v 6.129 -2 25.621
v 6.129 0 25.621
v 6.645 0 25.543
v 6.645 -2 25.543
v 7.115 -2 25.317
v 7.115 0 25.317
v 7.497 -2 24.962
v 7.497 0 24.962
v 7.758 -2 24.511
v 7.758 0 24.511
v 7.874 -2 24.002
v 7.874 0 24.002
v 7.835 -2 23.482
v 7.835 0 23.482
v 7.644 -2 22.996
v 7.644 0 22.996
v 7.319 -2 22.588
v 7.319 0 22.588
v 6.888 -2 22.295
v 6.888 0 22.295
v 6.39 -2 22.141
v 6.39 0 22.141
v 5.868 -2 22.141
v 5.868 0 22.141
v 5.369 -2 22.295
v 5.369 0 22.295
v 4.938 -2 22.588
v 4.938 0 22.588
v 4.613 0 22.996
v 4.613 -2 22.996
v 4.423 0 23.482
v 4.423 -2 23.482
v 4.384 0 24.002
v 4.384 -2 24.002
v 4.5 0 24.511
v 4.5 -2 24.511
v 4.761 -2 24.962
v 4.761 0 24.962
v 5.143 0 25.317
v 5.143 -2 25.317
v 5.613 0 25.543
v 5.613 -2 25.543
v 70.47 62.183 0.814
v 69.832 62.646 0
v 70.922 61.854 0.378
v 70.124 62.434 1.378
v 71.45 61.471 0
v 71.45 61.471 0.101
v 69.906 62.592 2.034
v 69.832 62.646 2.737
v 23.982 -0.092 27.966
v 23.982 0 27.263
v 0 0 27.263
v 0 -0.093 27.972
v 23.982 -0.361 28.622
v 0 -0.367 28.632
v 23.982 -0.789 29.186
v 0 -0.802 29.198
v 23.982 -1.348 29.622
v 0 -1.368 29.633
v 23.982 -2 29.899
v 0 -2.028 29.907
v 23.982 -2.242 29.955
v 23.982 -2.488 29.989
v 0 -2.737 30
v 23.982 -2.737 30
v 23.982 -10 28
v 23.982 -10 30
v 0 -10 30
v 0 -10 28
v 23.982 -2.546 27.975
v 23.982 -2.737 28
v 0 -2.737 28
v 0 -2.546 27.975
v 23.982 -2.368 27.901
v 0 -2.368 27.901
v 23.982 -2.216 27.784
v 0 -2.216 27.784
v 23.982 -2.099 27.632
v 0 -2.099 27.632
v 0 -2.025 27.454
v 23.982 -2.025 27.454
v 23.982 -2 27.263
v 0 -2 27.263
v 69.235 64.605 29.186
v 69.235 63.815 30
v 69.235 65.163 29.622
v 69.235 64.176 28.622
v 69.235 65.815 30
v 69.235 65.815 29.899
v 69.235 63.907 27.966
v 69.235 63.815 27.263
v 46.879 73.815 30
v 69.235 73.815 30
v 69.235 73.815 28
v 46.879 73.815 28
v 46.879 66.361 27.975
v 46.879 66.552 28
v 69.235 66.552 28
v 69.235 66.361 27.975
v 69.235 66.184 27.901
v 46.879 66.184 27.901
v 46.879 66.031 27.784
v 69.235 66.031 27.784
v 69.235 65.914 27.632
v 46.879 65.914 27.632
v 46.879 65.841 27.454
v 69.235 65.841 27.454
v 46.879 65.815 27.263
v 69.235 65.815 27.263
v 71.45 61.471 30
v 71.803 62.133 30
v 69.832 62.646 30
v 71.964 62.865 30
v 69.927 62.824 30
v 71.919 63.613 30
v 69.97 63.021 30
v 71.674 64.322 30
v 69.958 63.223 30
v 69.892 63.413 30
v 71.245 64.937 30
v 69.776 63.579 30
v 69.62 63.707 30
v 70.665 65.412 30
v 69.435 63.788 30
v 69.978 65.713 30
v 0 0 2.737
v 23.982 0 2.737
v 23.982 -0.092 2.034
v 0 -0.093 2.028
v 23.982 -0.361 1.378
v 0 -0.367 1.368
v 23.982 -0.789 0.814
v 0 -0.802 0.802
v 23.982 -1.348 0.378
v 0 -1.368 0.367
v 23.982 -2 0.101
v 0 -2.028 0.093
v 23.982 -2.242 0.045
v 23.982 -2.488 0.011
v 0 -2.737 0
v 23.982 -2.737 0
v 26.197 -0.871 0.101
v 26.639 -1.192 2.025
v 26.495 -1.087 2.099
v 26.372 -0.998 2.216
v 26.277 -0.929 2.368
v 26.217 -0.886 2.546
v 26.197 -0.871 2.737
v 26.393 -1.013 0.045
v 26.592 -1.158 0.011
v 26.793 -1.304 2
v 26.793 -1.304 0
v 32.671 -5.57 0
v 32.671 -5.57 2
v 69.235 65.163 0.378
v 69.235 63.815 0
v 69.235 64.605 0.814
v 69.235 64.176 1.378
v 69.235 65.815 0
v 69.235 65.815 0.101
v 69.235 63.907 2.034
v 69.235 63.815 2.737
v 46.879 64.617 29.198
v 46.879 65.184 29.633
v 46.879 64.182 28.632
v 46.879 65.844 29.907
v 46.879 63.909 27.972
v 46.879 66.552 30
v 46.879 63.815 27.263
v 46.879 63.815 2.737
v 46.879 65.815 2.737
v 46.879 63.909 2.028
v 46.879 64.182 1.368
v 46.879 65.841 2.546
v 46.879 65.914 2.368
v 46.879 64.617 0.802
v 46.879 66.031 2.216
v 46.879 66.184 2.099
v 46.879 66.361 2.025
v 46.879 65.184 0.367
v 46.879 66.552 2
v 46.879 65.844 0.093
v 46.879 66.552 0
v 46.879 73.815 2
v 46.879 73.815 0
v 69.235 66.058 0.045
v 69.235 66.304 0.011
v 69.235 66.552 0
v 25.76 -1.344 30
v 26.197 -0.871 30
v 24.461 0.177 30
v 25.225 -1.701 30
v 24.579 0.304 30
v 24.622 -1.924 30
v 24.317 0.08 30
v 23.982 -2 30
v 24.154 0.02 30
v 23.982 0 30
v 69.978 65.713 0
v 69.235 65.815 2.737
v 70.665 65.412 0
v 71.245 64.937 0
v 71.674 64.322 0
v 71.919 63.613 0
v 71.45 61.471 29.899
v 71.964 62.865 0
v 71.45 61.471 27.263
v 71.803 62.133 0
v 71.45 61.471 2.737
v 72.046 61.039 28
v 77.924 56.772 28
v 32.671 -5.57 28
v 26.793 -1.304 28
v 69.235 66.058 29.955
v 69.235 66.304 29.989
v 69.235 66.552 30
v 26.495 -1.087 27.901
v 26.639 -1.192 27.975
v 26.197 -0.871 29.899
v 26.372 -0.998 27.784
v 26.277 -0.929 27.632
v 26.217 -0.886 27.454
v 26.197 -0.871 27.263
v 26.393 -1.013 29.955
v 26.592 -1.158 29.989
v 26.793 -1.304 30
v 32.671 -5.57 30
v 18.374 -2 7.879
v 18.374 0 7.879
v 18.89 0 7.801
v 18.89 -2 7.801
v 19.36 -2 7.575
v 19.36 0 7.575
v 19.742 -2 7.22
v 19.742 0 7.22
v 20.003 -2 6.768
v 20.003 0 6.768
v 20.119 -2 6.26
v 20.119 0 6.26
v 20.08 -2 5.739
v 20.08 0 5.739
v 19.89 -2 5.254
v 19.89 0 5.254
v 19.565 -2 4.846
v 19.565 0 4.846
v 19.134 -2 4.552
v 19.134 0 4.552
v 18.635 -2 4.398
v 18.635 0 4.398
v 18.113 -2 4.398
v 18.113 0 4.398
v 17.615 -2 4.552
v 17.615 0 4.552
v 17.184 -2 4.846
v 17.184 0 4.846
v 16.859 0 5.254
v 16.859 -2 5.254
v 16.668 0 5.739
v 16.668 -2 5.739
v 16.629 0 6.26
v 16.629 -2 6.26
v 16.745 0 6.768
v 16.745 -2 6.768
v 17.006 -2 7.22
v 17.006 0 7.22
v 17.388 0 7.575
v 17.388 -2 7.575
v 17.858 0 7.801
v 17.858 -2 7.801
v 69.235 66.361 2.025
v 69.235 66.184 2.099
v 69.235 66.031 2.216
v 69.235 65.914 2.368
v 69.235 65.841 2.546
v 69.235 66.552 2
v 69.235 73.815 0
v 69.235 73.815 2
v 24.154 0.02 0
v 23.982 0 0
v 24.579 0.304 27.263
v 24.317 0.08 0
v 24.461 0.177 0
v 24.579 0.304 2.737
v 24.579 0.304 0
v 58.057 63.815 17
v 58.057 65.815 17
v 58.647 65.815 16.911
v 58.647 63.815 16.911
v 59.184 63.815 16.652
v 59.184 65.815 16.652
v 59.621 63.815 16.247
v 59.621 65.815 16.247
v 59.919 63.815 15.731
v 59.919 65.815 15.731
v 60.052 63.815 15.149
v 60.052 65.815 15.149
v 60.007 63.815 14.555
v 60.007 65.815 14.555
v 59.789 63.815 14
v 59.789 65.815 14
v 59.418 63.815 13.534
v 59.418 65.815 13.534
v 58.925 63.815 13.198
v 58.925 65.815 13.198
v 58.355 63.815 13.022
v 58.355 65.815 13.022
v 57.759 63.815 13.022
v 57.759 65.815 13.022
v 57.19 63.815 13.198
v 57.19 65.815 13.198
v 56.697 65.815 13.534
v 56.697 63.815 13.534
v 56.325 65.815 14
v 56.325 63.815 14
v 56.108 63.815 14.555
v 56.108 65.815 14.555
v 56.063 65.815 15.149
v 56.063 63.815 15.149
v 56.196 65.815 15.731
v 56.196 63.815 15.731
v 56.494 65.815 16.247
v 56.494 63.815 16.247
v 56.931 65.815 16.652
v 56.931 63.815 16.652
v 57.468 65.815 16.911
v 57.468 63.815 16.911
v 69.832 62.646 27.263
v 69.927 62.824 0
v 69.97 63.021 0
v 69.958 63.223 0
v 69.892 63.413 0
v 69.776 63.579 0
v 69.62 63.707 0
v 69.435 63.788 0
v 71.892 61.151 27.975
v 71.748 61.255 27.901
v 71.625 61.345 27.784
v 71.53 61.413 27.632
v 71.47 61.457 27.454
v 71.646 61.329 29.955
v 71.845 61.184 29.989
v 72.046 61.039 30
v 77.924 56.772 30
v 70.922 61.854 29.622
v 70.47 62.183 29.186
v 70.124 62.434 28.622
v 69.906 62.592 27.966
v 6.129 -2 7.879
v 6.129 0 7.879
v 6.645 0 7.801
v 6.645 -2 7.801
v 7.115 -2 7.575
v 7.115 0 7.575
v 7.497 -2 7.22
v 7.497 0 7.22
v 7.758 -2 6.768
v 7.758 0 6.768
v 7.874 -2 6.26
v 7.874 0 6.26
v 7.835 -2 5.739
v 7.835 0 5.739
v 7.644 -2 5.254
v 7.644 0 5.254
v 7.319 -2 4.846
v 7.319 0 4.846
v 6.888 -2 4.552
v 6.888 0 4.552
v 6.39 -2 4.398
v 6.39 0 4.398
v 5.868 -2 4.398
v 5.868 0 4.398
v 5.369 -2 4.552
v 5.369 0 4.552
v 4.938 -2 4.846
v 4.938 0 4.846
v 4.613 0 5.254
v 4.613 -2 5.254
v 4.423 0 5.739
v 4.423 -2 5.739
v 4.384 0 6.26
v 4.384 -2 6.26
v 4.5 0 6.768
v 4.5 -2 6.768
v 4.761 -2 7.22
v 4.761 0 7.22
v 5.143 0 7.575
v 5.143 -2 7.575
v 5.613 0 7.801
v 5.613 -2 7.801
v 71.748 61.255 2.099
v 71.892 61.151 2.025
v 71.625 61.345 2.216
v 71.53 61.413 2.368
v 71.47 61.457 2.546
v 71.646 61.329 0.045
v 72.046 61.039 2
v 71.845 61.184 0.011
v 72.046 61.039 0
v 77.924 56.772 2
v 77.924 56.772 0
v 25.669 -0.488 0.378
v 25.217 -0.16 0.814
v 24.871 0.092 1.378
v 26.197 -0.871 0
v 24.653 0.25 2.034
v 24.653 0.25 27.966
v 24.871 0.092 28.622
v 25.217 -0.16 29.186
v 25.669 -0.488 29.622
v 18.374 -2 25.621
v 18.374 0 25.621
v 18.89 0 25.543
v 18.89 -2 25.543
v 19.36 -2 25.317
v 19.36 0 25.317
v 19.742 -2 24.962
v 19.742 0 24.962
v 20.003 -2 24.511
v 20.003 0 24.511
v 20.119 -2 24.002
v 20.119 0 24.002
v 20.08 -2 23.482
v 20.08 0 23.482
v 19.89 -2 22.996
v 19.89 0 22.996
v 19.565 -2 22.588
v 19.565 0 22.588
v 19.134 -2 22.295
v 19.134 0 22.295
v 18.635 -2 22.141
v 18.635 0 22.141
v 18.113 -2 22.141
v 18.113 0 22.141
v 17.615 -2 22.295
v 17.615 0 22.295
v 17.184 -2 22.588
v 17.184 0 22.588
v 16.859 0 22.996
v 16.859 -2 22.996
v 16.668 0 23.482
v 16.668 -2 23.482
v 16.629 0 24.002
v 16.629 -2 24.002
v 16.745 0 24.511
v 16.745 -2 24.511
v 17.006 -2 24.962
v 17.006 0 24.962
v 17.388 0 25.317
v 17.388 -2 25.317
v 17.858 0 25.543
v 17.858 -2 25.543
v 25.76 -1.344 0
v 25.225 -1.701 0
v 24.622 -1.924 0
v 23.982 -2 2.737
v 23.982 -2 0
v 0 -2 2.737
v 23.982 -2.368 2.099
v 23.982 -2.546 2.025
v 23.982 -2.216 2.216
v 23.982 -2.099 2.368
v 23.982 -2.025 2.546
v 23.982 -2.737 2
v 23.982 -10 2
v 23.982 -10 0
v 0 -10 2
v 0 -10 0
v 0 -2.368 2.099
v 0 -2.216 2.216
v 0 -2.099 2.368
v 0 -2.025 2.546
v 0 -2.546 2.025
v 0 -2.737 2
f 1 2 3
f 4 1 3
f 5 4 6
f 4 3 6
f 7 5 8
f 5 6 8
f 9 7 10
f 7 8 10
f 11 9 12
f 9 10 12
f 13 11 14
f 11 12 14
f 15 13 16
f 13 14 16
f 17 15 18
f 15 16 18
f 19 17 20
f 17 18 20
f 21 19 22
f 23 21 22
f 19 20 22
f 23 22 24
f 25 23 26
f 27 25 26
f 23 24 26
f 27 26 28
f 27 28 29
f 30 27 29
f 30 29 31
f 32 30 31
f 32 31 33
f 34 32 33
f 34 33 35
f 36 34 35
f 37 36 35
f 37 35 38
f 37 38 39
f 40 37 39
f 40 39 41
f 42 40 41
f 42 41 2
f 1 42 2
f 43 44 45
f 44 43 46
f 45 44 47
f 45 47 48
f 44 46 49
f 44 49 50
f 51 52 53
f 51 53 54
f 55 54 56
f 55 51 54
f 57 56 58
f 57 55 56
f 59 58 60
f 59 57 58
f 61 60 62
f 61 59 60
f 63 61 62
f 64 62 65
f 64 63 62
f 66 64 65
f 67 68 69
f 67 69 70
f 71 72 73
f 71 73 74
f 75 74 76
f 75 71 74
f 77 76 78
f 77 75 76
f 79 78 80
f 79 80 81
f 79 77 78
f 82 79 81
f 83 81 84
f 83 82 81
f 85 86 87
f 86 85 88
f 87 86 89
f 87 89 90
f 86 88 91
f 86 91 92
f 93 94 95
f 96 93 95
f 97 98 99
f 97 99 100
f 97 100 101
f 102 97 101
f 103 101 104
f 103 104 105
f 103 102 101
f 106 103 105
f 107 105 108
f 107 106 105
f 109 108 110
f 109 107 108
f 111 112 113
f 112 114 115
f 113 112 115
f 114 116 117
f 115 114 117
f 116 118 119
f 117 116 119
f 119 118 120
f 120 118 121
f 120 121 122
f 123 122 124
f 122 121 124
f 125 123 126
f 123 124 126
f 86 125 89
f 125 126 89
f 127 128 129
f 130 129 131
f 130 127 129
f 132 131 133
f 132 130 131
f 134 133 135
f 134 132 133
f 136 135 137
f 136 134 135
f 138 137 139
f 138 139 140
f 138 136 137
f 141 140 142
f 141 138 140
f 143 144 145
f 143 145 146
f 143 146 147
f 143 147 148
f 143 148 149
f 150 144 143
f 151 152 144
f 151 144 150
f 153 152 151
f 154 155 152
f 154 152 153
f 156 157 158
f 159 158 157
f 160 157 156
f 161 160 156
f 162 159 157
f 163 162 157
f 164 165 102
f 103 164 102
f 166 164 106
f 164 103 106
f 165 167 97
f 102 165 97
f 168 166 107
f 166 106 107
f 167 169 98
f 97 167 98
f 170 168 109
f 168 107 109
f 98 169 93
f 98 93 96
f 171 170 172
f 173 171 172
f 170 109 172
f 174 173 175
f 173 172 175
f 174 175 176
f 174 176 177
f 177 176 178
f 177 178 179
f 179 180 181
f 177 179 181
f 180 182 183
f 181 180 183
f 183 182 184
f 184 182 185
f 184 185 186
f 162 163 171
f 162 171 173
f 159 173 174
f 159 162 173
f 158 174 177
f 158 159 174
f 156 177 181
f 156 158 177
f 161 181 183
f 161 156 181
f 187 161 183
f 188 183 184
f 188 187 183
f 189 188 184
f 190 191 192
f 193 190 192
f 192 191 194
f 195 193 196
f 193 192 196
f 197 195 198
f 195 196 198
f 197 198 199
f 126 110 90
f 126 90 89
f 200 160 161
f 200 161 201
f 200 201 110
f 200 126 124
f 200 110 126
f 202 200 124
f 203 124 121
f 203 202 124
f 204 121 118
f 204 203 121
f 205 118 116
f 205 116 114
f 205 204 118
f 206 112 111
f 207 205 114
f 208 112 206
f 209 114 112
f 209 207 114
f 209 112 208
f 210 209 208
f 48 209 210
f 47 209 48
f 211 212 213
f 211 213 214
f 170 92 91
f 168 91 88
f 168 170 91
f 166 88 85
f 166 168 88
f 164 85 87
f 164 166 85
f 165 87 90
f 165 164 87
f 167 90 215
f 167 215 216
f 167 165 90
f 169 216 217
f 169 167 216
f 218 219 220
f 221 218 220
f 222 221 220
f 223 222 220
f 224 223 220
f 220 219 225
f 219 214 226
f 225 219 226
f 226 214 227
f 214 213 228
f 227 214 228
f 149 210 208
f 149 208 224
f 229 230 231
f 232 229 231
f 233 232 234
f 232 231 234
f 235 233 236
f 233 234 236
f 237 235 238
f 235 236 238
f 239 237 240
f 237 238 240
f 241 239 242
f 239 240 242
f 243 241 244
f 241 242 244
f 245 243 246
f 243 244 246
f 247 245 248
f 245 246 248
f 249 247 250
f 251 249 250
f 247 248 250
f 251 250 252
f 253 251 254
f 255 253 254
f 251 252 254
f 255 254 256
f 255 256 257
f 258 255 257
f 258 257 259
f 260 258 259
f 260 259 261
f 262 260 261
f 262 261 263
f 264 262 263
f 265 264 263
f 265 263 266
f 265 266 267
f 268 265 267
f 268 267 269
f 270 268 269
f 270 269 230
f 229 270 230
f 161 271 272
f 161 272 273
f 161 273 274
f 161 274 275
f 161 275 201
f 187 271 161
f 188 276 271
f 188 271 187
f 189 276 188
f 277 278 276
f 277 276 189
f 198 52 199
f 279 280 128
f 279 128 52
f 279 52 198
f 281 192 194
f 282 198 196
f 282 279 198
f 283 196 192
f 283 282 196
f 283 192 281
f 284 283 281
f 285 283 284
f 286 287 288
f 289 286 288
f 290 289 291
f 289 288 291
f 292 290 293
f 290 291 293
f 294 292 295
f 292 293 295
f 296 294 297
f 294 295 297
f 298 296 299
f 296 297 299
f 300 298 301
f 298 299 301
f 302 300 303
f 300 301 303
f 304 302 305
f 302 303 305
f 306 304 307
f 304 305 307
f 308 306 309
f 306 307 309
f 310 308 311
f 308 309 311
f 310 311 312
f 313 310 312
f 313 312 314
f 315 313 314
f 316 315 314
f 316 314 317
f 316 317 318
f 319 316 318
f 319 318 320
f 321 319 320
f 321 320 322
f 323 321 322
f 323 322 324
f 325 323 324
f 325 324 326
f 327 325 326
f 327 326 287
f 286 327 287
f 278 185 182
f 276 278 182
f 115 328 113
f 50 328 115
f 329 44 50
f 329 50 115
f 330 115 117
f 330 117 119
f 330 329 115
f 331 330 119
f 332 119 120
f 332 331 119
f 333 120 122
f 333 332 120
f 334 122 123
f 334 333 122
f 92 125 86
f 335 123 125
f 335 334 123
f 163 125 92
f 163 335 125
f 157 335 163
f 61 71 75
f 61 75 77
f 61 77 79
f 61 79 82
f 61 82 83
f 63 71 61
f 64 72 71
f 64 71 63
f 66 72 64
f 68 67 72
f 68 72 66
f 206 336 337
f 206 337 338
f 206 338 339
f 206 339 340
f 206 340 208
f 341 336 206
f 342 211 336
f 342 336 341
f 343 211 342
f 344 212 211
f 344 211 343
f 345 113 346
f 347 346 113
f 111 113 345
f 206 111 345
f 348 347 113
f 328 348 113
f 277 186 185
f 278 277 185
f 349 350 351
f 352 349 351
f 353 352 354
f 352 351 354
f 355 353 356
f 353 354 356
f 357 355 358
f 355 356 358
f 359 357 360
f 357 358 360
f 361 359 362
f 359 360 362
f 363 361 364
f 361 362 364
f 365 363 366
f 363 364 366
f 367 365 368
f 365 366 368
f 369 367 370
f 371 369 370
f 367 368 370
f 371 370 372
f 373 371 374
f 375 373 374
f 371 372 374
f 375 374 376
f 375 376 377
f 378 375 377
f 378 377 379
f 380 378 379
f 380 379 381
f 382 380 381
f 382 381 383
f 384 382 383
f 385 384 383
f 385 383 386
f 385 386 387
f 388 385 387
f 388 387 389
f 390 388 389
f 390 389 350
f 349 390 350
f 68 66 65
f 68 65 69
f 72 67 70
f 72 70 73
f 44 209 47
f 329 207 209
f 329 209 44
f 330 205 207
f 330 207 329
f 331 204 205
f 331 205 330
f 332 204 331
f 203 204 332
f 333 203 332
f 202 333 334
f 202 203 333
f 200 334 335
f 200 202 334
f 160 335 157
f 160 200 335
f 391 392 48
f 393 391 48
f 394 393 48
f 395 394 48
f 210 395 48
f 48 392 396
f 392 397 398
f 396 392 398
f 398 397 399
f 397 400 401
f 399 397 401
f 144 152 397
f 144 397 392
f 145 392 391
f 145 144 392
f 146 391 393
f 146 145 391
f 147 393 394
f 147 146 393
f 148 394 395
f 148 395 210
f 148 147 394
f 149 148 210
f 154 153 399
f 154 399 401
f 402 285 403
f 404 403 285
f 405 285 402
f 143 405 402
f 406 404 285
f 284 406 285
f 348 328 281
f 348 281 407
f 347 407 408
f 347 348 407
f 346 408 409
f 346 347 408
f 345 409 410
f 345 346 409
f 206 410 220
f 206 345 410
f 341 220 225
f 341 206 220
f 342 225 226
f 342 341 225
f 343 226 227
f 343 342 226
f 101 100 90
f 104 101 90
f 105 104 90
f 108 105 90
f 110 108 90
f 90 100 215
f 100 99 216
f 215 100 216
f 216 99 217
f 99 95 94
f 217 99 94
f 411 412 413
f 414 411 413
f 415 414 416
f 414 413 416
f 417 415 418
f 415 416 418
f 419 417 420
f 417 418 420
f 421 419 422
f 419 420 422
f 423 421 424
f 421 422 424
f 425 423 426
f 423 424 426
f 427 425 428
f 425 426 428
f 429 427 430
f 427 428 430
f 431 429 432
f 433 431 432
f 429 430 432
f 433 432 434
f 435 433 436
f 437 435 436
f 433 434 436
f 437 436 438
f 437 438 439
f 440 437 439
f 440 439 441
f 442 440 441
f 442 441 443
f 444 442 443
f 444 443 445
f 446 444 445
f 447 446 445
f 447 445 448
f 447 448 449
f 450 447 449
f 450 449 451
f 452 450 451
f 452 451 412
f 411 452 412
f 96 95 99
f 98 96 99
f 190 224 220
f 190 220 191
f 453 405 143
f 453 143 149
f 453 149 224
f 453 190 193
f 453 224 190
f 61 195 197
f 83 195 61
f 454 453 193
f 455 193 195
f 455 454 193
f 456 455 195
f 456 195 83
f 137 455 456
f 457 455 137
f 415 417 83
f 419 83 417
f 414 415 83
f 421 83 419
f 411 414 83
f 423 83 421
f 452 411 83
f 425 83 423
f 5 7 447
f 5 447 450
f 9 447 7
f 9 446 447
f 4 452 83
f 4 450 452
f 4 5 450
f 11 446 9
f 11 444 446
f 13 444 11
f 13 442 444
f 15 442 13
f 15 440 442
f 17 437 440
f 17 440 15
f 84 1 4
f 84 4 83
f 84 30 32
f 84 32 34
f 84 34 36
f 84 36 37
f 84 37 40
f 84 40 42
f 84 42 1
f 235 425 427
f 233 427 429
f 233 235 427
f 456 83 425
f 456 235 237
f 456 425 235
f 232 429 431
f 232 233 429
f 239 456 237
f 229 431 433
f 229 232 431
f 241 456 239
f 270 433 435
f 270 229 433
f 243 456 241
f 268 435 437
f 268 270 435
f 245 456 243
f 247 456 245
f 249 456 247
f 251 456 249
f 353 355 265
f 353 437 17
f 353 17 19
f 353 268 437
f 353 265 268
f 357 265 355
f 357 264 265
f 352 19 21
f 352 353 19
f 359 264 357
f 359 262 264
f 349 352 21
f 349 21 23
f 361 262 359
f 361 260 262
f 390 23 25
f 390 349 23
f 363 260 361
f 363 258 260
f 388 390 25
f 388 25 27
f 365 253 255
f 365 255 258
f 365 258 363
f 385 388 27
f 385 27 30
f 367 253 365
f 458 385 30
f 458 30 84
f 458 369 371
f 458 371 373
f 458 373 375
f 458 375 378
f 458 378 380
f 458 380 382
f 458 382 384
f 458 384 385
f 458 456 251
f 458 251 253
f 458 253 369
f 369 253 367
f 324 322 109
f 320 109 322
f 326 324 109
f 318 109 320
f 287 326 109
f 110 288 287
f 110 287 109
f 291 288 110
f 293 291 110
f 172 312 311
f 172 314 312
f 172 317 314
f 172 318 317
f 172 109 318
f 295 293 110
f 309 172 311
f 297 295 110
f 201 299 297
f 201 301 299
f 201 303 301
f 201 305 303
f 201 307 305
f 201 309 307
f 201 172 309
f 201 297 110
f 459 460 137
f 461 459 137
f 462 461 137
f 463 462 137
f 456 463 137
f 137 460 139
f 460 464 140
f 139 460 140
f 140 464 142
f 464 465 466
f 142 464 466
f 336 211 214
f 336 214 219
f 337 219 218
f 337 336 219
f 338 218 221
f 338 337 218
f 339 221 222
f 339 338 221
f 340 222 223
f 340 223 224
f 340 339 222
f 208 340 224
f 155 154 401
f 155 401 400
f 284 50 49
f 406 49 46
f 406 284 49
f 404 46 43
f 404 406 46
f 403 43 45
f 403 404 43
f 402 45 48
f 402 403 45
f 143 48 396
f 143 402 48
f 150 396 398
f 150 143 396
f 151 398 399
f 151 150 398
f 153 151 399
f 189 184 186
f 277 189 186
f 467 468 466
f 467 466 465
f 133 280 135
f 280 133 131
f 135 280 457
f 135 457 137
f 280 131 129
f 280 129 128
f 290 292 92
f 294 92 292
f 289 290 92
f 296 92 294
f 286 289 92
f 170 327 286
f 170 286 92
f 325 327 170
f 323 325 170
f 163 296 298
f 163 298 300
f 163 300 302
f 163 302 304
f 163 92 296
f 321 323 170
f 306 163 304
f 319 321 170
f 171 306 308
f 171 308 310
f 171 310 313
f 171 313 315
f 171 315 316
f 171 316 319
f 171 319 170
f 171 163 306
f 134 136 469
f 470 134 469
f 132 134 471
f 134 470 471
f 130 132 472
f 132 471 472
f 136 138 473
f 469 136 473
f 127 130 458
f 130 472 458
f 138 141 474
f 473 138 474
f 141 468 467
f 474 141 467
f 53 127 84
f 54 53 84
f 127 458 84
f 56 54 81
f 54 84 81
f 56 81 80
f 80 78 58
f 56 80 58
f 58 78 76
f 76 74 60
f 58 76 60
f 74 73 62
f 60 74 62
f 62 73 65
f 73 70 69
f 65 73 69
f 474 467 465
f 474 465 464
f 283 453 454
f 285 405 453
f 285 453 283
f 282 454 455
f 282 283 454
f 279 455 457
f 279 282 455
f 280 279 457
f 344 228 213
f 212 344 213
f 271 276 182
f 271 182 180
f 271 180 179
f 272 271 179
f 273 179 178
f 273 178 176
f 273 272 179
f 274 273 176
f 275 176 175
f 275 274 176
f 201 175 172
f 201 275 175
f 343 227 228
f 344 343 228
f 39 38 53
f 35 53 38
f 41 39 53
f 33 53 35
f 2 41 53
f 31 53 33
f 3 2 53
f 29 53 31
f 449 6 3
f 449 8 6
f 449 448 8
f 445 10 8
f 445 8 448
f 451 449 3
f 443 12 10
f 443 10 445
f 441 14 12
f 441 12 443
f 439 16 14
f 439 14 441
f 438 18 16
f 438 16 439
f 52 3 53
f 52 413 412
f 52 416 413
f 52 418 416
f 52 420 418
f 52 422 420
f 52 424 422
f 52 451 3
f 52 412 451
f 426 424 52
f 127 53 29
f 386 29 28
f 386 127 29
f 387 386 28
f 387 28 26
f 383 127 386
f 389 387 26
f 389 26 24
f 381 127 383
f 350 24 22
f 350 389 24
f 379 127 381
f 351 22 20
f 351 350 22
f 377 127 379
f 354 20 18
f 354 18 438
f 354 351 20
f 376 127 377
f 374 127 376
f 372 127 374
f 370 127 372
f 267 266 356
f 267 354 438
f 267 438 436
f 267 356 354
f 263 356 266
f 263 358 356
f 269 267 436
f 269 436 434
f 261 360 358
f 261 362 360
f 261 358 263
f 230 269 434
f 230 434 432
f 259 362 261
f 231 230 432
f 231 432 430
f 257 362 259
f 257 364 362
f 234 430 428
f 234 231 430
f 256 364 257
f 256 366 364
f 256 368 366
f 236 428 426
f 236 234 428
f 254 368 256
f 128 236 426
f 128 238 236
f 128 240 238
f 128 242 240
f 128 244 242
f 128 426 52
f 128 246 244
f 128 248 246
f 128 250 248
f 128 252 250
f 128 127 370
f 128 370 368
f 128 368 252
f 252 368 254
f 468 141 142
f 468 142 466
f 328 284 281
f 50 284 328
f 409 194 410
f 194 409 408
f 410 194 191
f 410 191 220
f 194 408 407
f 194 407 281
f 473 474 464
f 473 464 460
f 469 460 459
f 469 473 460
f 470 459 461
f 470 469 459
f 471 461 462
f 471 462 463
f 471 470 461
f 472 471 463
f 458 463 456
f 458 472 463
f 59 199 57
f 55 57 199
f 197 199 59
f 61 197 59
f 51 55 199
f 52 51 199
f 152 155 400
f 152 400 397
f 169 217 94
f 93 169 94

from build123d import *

# Parameters (mm, degrees)
BASE_FLANGE1_DEPTH             = 30
EDGE_FLANGE3_STRIP_W           = 9.4732
EDGE_FLANGE3_STRIP_H           = 2
EDGE_FLANGE3_STRIP_CUT_DEPTH   = 23.982438423
EDGE_FLANGE3_STRIP_2_W         = 9.4732
EDGE_FLANGE3_STRIP_2_H         = 2
EDGE_FLANGE3_STRIP_CUT_2_DEPTH = 23.982438423
EDGE_FLANGE3_STRIP_3_W         = 9.4732
EDGE_FLANGE3_STRIP_3_H         = 2
EDGE_FLANGE3_STRIP_CUT_3_DEPTH = 22.356175112
EDGE_FLANGE3_STRIP_4_W         = 9.4732
EDGE_FLANGE3_STRIP_4_H         = 2
EDGE_FLANGE3_STRIP_CUT_4_DEPTH = 22.356175112
EDGE_FLANGE3_STRIP_5_W         = 9.4732
EDGE_FLANGE3_STRIP_5_H         = 2
EDGE_FLANGE3_STRIP_CUT_5_DEPTH = 77.034991311
EDGE_FLANGE3_STRIP_6_W         = 9.4732
EDGE_FLANGE3_STRIP_6_H         = 2
EDGE_FLANGE3_STRIP_CUT_6_DEPTH = 77.034991311
EDGE_FLANGE3_DEPTH             = 23.982438423
EDGE_FLANGE3_BEND_DEPTH        = 23.982438423
EDGE_FLANGE3_BEND_2_DEPTH      = 22.356175112
EDGE_FLANGE3_BEND_3_DEPTH      = 22.356175112
EDGE_FLANGE3_BEND_4_DEPTH      = 77.034991311
EDGE_FLANGE3_BEND_5_DEPTH      = 77.034991311
CUT_EXTRUDE1_REACH             = 114.784
SKETCH35_R                     = 1.75
SKETCH35_R_2                   = 2


# Sheet-metal steps are written as plain solids
with BuildPart() as part:
    # Sketch1 → Base-Flange1 (new body)
    with BuildSketch(Plane.XY):
        with BuildLine():
            Line((0, 0), (23.982438423, 0))
            ThreePointArc((23.982438423, 0), (24.316990043, 0.080357077), (24.578547934, 0.3038957))
            Line((24.578547934, 0.3038957), (69.831564503, 62.646131606))
            ThreePointArc((69.831564503, 62.646131606), (69.891697915, 63.413387526), (69.235454992, 63.815435906))
            Line((69.235454992, 63.815435906), (46.87927988, 63.815435906))
            Line((46.87927988, 63.815435906), (46.87927988, 65.815435906))
            Line((46.87927988, 65.815435906), (69.235454992, 65.815435906))
            ThreePointArc((69.235454992, 65.815435906), (71.673514159, 64.321754671), (71.450107838, 61.471262477))
            Line((71.450107838, 61.471262477), (26.19709127, -0.870973429))
            ThreePointArc((26.19709127, -0.870973429), (25.225357188, -1.701459167), (23.982438423, -2))
            Line((23.982438423, -2), (0, -2))
            Line((0, -2), (0, 0))
        make_face()
    extrude(amount=BASE_FLANGE1_DEPTH)

    # Edge-Flange3 strip (across the edge) → Edge-Flange3 strip cut (cut)
    with BuildSketch(Plane(origin=(0, -2, 0), x_dir=(0, 0, 1), z_dir=(1, 0, 0))):
        with Locations((-2, -1)):
            Rectangle(EDGE_FLANGE3_STRIP_W, EDGE_FLANGE3_STRIP_H)
    extrude(amount=EDGE_FLANGE3_STRIP_CUT_DEPTH, mode=Mode.SUBTRACT)

    # Edge-Flange3 strip 2 (across the edge) → Edge-Flange3 strip cut 2 (cut)
    with BuildSketch(Plane(origin=(23.982438423, -2, 30), x_dir=(0, 0, -1), z_dir=(-1, 0, 0))):
        with Locations((-2, -1)):
            Rectangle(EDGE_FLANGE3_STRIP_2_W, EDGE_FLANGE3_STRIP_2_H)
    extrude(amount=EDGE_FLANGE3_STRIP_CUT_2_DEPTH, mode=Mode.SUBTRACT)

    # Edge-Flange3 strip 3 (across the edge) → Edge-Flange3 strip cut 3 (cut)
    with BuildSketch(Plane(origin=(46.87927988, 65.815435906, 30), x_dir=(0, 0, -1), z_dir=(1, 0, 0))):
        with Locations((-2, -1)):
            Rectangle(EDGE_FLANGE3_STRIP_3_W, EDGE_FLANGE3_STRIP_3_H)
    extrude(amount=EDGE_FLANGE3_STRIP_CUT_3_DEPTH, mode=Mode.SUBTRACT)

    # Edge-Flange3 strip 4 (across the edge) → Edge-Flange3 strip cut 4 (cut)
    with BuildSketch(Plane(origin=(69.235454992, 65.815435906, 0), x_dir=(0, 0, 1), z_dir=(-1, 0, 0))):
        with Locations((-2, -1)):
            Rectangle(EDGE_FLANGE3_STRIP_4_W, EDGE_FLANGE3_STRIP_4_H)
    extrude(amount=EDGE_FLANGE3_STRIP_CUT_4_DEPTH, mode=Mode.SUBTRACT)

    # Edge-Flange3 strip 5 (across the edge) → Edge-Flange3 strip cut 5 (cut)
    with BuildSketch(Plane(origin=(26.19709127, -0.870973429, 0), x_dir=(0, 0, 1), z_dir=(0.5874345644557342, 0.8092716679105367, 0))):
        with Locations((-2, -1)):
            Rectangle(EDGE_FLANGE3_STRIP_5_W, EDGE_FLANGE3_STRIP_5_H)
    extrude(amount=EDGE_FLANGE3_STRIP_CUT_5_DEPTH, mode=Mode.SUBTRACT)

    # Edge-Flange3 strip 6 (across the edge) → Edge-Flange3 strip cut 6 (cut)
    with BuildSketch(Plane(origin=(71.450107838, 61.471262477, 30), x_dir=(0, 0, -1), z_dir=(-0.5874345644557342, -0.8092716679105367, 0))):
        with Locations((-2, -1)):
            Rectangle(EDGE_FLANGE3_STRIP_6_W, EDGE_FLANGE3_STRIP_6_H)
    extrude(amount=EDGE_FLANGE3_STRIP_CUT_6_DEPTH, mode=Mode.SUBTRACT)

    # Edge-Flange3 section (across the edge) → Edge-Flange3 (add)
    with BuildSketch(Plane(origin=(0, -2, 0), x_dir=(0, 0, 1), z_dir=(1, 0, 0))):
        with BuildLine():
            Line((0, 0.7366), (0, 8))
            Line((0, 8), (2, 8))
            Line((2, 8), (2, 0.7366))
            ThreePointArc((2, 0.7366), (2.215745145, 0.215745145), (2.7366, 0))
            Line((2.7366, 0), (2.7366, -2))
            ThreePointArc((2.7366, -2), (0.801531583, -1.198468417), (0, 0.7366))
        make_face()
    extrude(amount=EDGE_FLANGE3_DEPTH)

    # Edge-Flange3 section 2 (across the edge) → Edge-Flange3 bend (add)
    with BuildSketch(Plane(origin=(23.982438423, -2, 30), x_dir=(0, 0, -1), z_dir=(-1, 0, 0))):
        with BuildLine():
            Line((0, 0.7366), (0, 8))
            Line((0, 8), (2, 8))
            Line((2, 8), (2, 0.7366))
            ThreePointArc((2, 0.7366), (2.215745145, 0.215745145), (2.7366, 0))
            Line((2.7366, 0), (2.7366, -2))
            ThreePointArc((2.7366, -2), (0.801531583, -1.198468417), (0, 0.7366))
        make_face()
    extrude(amount=EDGE_FLANGE3_BEND_DEPTH)

    # Edge-Flange3 section 3 (across the edge) → Edge-Flange3 bend 2 (add)
    with BuildSketch(Plane(origin=(46.87927988, 65.815435906, 30), x_dir=(0, 0, -1), z_dir=(1, 0, 0))):
        with BuildLine():
            Line((0, 0.7366), (0, 8))
            Line((0, 8), (2, 8))
            Line((2, 8), (2, 0.7366))
            ThreePointArc((2, 0.7366), (2.215745145, 0.215745145), (2.7366, 0))
            Line((2.7366, 0), (2.7366, -2))
            ThreePointArc((2.7366, -2), (0.801531583, -1.198468417), (0, 0.7366))
        make_face()
    extrude(amount=EDGE_FLANGE3_BEND_2_DEPTH)

    # Edge-Flange3 section 4 (across the edge) → Edge-Flange3 bend 3 (add)
    with BuildSketch(Plane(origin=(69.235454992, 65.815435906, 0), x_dir=(0, 0, 1), z_dir=(-1, 0, 0))):
        with BuildLine():
            Line((0, 0.7366), (0, 8))
            Line((0, 8), (2, 8))
            Line((2, 8), (2, 0.7366))
            ThreePointArc((2, 0.7366), (2.215745145, 0.215745145), (2.7366, 0))
            Line((2.7366, 0), (2.7366, -2))
            ThreePointArc((2.7366, -2), (0.801531583, -1.198468417), (0, 0.7366))
        make_face()
    extrude(amount=EDGE_FLANGE3_BEND_3_DEPTH)

    # Edge-Flange3 section 5 (across the edge) → Edge-Flange3 bend 4 (add)
    with BuildSketch(Plane(origin=(26.19709127, -0.870973429, 0), x_dir=(0, 0, 1), z_dir=(0.5874345644557342, 0.8092716679105367, 0))):
        with BuildLine():
            Line((0, 0.7366), (0, 8))
            Line((0, 8), (2, 8))
            Line((2, 8), (2, 0.7366))
            ThreePointArc((2, 0.7366), (2.215745145, 0.215745145), (2.7366, 0))
            Line((2.7366, 0), (2.7366, -2))
            ThreePointArc((2.7366, -2), (0.801531583, -1.198468417), (0, 0.7366))
        make_face()
    extrude(amount=EDGE_FLANGE3_BEND_4_DEPTH)

    # Edge-Flange3 section 6 (across the edge) → Edge-Flange3 bend 5 (add)
    with BuildSketch(Plane(origin=(71.450107838, 61.471262477, 30), x_dir=(0, 0, -1), z_dir=(-0.5874345644557342, -0.8092716679105367, 0))):
        with BuildLine():
            Line((0, 0.7366), (0, 8))
            Line((0, 8), (2, 8))
            Line((2, 8), (2, 0.7366))
            ThreePointArc((2, 0.7366), (2.215745145, 0.215745145), (2.7366, 0))
            Line((2.7366, 0), (2.7366, -2))
            ThreePointArc((2.7366, -2), (0.801531583, -1.198468417), (0, 0.7366))
        make_face()
    extrude(amount=EDGE_FLANGE3_BEND_5_DEPTH)

    # Sketch35 → Cut-Extrude1 (cut, up to next)
    with BuildSketch(Plane(origin=(0, 65.815435906, 0), x_dir=(1, 0, 0), z_dir=(0, 1, 0)), mode=Mode.PRIVATE) as cut_extrude1_sk1:
        with Locations(Location((6.128769165, -6.128769165, 0), (0, 0, 270))):
            Circle(SKETCH35_R)
    cut_extrude1_tool1 = extrude(cut_extrude1_sk1.sketch, amount=-CUT_EXTRUDE1_REACH, mode=Mode.PRIVATE) & part.part
    # Sketch35 → Cut-Extrude1 (cut, up to next)
    with BuildSketch(Plane(origin=(0, 65.815435906, 0), x_dir=(1, 0, 0), z_dir=(0, 1, 0)), mode=Mode.PRIVATE) as cut_extrude1_sk2:
        with Locations(Location((18.374243868, -6.128769165, 0), (0, 0, 270))):
            Circle(SKETCH35_R)
    cut_extrude1_tool2 = extrude(cut_extrude1_sk2.sketch, amount=-CUT_EXTRUDE1_REACH, mode=Mode.PRIVATE) & part.part
    # Sketch35 → Cut-Extrude1 (cut, up to next)
    with BuildSketch(Plane(origin=(0, 65.815435906, 0), x_dir=(1, 0, 0), z_dir=(0, 1, 0)), mode=Mode.PRIVATE) as cut_extrude1_sk3:
        with Locations(Location((6.128769165, -23.871230835, 0), (0, 0, 270))):
            Circle(SKETCH35_R)
    cut_extrude1_tool3 = extrude(cut_extrude1_sk3.sketch, amount=-CUT_EXTRUDE1_REACH, mode=Mode.PRIVATE) & part.part
    # Sketch35 → Cut-Extrude1 (cut, up to next)
    with BuildSketch(Plane(origin=(0, 65.815435906, 0), x_dir=(1, 0, 0), z_dir=(0, 1, 0)), mode=Mode.PRIVATE) as cut_extrude1_sk4:
        with Locations(Location((18.374243868, -23.871230835, 0), (0, 0, 270))):
            Circle(SKETCH35_R)
    cut_extrude1_tool4 = extrude(cut_extrude1_sk4.sketch, amount=-CUT_EXTRUDE1_REACH, mode=Mode.PRIVATE) & part.part
    # Sketch35 → Cut-Extrude1 (cut, up to next)
    with BuildSketch(Plane(origin=(0, 65.815435906, 0), x_dir=(1, 0, 0), z_dir=(0, 1, 0)), mode=Mode.PRIVATE) as cut_extrude1_sk5:
        with Locations(Location((58.057367436, -15, 0), (0, 0, 270))):
            Circle(SKETCH35_R_2)
    cut_extrude1_tool5 = extrude(cut_extrude1_sk5.sketch, amount=-CUT_EXTRUDE1_REACH, mode=Mode.PRIVATE) & part.part
    add(cut_extrude1_tool1.solids().sort_by_distance((6.128769, 65.815436, 6.128769))[0], mode=Mode.SUBTRACT)
    add(cut_extrude1_tool2.solids().sort_by_distance((18.374244, 65.815436, 6.128769))[0], mode=Mode.SUBTRACT)
    add(cut_extrude1_tool3.solids().sort_by_distance((6.128769, 65.815436, 23.871231))[0], mode=Mode.SUBTRACT)
    add(cut_extrude1_tool4.solids().sort_by_distance((18.374244, 65.815436, 23.871231))[0], mode=Mode.SUBTRACT)
    add(cut_extrude1_tool5.solids().sort_by_distance((58.057367, 65.815436, 15))[0], mode=Mode.SUBTRACT)


solid = part.part
